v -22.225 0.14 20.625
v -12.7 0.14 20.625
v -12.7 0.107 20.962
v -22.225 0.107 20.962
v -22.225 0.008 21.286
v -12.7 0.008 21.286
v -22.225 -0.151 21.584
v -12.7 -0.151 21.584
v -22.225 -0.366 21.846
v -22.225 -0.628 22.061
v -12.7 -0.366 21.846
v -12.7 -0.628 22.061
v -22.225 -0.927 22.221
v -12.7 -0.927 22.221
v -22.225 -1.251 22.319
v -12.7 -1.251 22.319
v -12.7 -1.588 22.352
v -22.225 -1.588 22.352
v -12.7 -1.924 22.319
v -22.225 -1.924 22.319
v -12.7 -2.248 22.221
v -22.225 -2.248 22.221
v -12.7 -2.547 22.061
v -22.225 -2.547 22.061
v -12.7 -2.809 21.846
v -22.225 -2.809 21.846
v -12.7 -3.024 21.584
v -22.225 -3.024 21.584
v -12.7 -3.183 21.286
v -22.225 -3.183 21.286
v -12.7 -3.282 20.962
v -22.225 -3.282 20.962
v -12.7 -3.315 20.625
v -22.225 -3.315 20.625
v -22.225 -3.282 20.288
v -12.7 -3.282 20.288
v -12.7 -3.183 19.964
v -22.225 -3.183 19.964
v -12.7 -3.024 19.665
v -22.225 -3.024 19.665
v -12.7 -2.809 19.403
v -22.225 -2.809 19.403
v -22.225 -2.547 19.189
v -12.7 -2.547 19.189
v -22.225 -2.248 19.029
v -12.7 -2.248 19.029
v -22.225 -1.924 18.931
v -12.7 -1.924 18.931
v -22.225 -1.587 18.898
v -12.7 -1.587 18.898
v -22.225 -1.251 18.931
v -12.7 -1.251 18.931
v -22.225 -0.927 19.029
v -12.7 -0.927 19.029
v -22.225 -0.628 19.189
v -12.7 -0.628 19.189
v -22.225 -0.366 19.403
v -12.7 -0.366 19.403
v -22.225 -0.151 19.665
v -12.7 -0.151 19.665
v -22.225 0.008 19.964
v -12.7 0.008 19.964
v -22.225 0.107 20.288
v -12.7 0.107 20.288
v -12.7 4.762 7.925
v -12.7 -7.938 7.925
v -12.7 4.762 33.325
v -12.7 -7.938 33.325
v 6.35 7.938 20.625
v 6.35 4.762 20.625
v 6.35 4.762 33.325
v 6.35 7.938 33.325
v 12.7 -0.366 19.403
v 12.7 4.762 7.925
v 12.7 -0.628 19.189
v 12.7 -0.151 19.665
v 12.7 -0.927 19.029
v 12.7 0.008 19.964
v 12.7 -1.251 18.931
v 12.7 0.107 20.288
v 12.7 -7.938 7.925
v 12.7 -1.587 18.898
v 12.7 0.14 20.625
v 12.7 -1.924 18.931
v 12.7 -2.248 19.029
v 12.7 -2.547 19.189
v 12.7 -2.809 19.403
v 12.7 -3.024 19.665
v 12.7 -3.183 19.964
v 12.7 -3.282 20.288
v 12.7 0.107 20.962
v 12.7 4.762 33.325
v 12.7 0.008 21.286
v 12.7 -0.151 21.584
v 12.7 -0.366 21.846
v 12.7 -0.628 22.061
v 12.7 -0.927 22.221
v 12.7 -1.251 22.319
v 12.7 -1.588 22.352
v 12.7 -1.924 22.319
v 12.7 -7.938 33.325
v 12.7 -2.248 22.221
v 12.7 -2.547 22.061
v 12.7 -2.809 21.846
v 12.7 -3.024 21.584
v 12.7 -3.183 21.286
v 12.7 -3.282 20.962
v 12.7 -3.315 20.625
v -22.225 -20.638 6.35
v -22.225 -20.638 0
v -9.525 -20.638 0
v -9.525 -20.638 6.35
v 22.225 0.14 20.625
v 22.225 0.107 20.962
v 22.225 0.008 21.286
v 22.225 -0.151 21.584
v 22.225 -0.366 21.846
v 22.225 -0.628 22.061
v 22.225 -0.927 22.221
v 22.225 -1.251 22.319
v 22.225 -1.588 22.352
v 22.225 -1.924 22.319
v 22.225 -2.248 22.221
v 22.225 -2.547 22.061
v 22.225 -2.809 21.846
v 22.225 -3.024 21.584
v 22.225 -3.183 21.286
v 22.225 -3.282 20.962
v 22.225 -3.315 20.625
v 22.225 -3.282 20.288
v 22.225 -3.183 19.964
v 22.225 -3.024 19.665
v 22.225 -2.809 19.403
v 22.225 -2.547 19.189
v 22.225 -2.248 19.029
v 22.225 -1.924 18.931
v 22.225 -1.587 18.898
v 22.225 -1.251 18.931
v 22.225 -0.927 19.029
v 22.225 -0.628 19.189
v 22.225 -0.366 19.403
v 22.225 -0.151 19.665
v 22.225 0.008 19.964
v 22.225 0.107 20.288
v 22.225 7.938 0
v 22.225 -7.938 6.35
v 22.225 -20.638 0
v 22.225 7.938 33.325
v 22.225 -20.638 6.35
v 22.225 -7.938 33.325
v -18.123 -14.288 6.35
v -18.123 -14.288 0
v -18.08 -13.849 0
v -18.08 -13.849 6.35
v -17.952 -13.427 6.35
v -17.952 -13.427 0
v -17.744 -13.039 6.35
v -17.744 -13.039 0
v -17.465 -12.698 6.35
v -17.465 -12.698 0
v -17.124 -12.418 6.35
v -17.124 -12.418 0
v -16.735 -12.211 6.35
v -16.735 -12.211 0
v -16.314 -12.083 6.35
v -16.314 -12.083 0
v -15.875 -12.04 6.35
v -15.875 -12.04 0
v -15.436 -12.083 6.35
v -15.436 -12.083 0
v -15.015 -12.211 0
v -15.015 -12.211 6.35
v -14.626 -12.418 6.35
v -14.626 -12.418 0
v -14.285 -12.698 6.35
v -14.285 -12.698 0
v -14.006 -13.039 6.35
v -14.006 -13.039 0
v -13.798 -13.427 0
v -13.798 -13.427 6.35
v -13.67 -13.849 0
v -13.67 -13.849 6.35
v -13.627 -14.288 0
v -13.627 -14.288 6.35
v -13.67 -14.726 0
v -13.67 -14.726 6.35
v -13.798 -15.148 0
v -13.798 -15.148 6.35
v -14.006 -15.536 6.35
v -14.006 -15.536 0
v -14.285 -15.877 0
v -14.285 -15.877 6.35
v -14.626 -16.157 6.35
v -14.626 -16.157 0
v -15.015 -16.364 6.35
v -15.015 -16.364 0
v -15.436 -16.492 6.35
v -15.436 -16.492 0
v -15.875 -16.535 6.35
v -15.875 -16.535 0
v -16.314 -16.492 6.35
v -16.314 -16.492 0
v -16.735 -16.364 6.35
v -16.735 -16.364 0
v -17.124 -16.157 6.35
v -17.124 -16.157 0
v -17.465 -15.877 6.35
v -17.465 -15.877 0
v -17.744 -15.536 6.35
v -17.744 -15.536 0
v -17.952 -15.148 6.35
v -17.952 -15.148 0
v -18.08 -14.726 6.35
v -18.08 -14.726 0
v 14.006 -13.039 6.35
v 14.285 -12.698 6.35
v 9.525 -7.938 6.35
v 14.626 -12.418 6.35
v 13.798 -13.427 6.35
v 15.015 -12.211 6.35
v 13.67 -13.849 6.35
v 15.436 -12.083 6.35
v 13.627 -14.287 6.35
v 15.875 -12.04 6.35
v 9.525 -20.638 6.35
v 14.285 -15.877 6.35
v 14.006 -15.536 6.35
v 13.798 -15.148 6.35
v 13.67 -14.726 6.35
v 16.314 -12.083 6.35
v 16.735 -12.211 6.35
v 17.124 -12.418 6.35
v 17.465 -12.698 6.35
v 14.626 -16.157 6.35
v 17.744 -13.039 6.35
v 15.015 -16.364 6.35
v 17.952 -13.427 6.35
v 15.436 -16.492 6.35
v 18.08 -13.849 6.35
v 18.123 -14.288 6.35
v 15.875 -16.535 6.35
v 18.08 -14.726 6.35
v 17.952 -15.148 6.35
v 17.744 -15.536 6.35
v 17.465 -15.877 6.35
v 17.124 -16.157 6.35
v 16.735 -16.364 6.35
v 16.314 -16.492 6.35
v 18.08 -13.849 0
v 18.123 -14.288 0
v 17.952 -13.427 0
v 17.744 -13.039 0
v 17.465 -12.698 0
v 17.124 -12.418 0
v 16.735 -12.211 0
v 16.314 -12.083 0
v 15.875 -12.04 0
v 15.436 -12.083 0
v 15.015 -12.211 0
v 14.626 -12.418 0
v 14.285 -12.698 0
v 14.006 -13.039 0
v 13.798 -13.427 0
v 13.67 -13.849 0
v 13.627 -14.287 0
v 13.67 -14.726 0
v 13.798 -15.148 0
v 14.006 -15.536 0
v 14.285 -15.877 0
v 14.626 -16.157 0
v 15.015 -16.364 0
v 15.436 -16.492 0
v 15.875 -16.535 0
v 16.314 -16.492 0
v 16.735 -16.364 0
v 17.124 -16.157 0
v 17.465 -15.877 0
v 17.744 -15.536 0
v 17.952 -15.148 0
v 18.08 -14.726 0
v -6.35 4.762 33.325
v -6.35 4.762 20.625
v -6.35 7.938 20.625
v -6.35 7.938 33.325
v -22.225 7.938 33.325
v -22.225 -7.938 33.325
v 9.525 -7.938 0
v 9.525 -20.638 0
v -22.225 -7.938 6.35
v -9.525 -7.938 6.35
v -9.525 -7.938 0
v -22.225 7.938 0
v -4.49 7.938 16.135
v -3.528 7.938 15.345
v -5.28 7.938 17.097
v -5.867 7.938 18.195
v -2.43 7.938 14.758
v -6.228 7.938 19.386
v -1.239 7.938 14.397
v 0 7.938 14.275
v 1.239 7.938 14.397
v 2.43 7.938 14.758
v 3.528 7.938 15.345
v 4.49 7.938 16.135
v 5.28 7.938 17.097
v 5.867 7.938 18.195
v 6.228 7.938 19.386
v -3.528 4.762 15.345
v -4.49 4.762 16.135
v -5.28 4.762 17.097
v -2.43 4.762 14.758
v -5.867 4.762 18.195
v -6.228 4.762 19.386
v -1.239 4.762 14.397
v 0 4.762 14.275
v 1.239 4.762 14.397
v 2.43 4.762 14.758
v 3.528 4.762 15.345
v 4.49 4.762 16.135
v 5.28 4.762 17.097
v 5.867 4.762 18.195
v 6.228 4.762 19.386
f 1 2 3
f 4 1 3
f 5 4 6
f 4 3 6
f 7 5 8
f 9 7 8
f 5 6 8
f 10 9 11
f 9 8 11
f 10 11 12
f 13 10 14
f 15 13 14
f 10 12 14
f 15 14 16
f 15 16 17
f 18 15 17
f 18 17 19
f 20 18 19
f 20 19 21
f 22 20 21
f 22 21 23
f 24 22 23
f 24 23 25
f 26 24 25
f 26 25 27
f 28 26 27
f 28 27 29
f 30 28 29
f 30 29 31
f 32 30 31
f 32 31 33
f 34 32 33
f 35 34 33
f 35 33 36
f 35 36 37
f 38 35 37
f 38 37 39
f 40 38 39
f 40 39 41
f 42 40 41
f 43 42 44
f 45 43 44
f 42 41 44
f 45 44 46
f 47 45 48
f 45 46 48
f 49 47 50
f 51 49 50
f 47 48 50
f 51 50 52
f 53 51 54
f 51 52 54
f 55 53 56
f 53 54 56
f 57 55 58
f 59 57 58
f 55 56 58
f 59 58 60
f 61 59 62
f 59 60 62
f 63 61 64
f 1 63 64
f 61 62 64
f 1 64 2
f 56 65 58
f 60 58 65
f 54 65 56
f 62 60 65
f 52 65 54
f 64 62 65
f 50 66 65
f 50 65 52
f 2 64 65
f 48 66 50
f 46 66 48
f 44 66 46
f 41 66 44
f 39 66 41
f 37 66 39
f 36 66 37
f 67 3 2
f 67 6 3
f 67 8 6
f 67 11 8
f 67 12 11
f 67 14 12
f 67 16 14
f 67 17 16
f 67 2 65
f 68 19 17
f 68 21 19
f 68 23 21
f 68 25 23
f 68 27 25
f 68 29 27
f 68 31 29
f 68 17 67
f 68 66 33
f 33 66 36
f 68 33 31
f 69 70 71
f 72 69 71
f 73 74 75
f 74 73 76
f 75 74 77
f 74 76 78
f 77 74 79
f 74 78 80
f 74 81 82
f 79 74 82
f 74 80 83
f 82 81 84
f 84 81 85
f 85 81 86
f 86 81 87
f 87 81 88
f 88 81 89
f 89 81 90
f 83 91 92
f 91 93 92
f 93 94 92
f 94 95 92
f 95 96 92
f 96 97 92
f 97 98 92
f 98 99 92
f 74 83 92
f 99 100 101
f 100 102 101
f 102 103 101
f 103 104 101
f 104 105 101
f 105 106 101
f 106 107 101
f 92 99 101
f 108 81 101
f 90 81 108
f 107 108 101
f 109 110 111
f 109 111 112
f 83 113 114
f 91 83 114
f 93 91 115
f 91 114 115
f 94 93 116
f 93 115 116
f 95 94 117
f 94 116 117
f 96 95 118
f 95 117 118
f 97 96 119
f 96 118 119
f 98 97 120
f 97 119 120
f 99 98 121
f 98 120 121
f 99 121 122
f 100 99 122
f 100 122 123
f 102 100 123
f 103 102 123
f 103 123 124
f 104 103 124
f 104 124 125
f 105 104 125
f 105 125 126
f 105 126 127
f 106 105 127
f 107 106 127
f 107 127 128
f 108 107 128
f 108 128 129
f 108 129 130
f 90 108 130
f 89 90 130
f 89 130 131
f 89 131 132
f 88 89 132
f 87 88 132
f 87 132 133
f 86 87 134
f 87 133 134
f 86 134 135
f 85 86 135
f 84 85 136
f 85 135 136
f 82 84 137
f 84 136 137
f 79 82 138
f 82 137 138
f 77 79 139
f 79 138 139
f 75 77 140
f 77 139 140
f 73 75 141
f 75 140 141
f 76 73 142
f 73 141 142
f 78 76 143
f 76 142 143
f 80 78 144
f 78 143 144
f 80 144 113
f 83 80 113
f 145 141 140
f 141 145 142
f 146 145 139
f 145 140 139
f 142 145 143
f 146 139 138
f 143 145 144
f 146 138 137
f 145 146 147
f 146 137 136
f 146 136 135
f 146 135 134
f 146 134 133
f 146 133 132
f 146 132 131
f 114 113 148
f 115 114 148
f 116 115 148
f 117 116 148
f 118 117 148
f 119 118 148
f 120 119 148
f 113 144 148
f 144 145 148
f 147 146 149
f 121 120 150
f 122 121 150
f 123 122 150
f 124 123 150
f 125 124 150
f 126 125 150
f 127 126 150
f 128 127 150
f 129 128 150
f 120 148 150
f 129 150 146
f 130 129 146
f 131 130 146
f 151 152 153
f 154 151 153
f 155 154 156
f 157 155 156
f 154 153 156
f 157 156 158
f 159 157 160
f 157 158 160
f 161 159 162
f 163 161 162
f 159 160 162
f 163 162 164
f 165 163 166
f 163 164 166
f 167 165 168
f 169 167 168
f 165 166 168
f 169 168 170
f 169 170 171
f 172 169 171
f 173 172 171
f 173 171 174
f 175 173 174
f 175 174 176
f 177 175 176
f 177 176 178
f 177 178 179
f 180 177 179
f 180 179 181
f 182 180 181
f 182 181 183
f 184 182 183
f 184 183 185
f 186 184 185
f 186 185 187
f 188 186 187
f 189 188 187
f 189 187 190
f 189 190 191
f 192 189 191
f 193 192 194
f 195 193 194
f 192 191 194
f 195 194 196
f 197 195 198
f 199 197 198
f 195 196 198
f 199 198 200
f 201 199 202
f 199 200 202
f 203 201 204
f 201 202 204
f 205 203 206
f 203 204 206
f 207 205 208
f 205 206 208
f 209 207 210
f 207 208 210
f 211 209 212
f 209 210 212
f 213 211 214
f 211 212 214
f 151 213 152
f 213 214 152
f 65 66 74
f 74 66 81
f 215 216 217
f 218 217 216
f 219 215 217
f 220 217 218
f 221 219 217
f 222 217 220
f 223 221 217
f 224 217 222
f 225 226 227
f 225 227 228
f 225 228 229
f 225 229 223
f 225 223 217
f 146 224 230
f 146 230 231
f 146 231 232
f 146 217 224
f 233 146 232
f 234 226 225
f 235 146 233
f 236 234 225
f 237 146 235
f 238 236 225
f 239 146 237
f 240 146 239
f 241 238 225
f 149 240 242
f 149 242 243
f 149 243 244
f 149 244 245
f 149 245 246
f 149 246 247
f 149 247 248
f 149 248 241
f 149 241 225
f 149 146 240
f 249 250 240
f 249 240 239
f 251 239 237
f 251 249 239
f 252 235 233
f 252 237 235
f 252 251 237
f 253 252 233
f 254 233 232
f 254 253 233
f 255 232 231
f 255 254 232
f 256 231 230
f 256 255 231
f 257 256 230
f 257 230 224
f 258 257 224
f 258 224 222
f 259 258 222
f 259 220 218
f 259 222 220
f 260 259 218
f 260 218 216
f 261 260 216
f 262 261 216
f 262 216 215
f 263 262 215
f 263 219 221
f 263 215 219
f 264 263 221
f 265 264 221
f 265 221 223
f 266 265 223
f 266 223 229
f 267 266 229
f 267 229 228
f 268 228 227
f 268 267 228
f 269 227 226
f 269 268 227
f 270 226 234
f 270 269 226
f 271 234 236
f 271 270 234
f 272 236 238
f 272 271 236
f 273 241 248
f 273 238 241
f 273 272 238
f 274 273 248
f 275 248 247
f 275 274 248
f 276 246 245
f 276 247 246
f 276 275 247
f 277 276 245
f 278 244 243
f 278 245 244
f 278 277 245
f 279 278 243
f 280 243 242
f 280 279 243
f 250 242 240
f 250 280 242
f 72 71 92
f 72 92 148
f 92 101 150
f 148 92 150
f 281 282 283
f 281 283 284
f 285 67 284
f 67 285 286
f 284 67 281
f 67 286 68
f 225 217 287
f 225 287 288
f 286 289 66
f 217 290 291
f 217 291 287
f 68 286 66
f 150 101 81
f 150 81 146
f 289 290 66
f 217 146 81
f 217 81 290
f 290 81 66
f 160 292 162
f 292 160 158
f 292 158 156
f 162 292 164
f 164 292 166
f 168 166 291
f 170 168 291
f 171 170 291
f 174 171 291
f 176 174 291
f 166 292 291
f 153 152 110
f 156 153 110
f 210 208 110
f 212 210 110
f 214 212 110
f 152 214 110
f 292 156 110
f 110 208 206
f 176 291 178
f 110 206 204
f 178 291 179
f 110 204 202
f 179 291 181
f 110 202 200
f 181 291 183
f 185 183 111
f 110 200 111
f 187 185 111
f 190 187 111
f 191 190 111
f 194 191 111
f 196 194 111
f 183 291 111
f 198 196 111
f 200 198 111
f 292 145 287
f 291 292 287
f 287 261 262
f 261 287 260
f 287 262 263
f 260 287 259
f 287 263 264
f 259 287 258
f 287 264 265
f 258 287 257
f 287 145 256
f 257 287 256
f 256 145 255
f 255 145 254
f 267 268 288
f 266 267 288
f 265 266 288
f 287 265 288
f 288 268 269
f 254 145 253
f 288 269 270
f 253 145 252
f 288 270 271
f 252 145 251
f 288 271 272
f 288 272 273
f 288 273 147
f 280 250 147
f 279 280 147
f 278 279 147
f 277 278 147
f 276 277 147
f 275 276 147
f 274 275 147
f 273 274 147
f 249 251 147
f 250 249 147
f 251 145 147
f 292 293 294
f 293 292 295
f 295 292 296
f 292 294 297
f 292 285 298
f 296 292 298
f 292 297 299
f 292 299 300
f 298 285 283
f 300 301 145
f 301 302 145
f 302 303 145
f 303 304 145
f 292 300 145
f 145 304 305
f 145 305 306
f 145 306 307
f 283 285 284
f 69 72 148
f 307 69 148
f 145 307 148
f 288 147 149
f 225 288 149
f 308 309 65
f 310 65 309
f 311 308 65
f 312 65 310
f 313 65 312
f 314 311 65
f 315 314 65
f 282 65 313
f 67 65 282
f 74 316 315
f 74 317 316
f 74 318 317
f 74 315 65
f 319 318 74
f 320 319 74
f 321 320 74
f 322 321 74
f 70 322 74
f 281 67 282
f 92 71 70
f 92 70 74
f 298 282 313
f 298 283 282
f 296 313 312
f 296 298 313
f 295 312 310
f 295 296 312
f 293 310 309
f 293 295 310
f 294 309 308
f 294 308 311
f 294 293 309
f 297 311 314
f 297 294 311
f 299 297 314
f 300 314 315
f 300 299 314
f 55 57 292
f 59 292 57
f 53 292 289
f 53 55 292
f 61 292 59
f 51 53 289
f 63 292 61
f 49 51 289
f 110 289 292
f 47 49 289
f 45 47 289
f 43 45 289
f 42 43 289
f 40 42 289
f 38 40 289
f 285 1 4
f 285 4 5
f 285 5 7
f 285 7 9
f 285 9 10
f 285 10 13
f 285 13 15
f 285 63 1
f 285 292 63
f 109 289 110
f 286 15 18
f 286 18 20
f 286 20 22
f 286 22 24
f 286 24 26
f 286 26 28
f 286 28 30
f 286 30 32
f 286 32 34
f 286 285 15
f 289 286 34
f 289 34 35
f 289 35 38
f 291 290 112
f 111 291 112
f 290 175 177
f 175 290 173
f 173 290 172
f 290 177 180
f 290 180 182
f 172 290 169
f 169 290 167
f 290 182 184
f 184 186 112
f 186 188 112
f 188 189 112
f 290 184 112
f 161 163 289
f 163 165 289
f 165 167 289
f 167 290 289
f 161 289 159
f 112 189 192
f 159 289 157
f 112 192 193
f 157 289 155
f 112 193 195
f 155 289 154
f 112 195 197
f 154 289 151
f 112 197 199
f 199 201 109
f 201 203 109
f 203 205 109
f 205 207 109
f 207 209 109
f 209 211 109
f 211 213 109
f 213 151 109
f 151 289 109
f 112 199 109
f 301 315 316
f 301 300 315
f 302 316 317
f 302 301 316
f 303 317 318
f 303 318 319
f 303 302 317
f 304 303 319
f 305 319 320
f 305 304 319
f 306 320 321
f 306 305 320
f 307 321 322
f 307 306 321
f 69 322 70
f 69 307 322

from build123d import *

# Parameters (mm, degrees)
F0_W     = 44.45
F0_H     = 33.3248
F1_DEPTH = 7.9375
F2_W     = 25.4
F2_H     = 25.4
F3_DEPTH = 12.7
F5_W     = 12.7
F5_H     = 19.05
F6_DEPTH = 3.176
F7_R     = 6.34999
F8_W     = 12.7
F8_H     = 6.35
F9_DEPTH = 12.7
F11_D    = 4.4958
F13_D    = 3.4544


# Not quite as in the source:
# - a fillet or chamfer is up to 0.001 mm smaller than in the source, because OpenCascade refuses the exact size
# - a pattern or mirror of a feature is missing from the dataset's text; its kind, count and spacing are read off the source's solid


with BuildPart() as f1:
    # F0 (on Front) → F1 (new body, symmetric)
    with BuildSketch(Plane.XZ):
        with Locations((0, 16.6624)):
            Rectangle(F0_W, F0_H)
    extrude(amount=F1_DEPTH, both=True)

    # F2 (on face) → F3 (cut)
    with BuildSketch(Plane.XZ.offset(7.9375)):
        with Locations((0, 20.6248)):
            Rectangle(F2_W, F2_H)
    extrude(amount=-F3_DEPTH, mode=Mode.SUBTRACT)

    # F5 (on face) → F6 (cut, through all)
    with BuildSketch(Plane.XZ.offset(-4.7625)):
        with Locations((0, 23.7998)):
            Rectangle(F5_W, F5_H)
    extrude(amount=-F6_DEPTH, mode=Mode.SUBTRACT)

    # F7 (radius 6.35 in the source; OpenCascade refuses exactly that, so slightly less here)
    f7_edges = [f1.edges().sort_by_distance(p)[0] for p in [
        (-6.35, 6.35, 14.2748),
        (6.35, 6.35, 14.2748),
    ]]
    fillet(f7_edges, radius=F7_R)

    # F8 (on face) → F9 (join)
    with BuildSketch(Plane(origin=(-22.225, 0, 0), x_dir=(0, -1, 0), z_dir=(-1, 0, 0))):
        with Locations((14.2875, 3.175)):
            Rectangle(F8_W, F8_H)
    f9 = extrude(amount=-F9_DEPTH)

    # F9_copies: F9 across plane
    add(f9.mirror(Plane(origin=(0, 0, 0), x_dir=(0, 0, 1), z_dir=(1, 0, 0))))

    # F11 (through all)
    with Locations(Plane.XY.offset(6.35)):
        with Locations((-15.875, -14.2875)):
            f11 = Hole(F11_D / 2)

    # F11_copies: F11 across plane
    add(f11.mirror(Plane(origin=(0, 0, 0), x_dir=(0, 0, 1), z_dir=(1, 0, 0))), mode=Mode.SUBTRACT)

    # F13 (through all)
    with Locations(Plane(origin=(-22.225, 0, 0), x_dir=(0, -1, 0), z_dir=(-1, 0, 0))):
        with Locations((1.5875, 20.6248)):
            Hole(F13_D / 2)


solid = f1.part
